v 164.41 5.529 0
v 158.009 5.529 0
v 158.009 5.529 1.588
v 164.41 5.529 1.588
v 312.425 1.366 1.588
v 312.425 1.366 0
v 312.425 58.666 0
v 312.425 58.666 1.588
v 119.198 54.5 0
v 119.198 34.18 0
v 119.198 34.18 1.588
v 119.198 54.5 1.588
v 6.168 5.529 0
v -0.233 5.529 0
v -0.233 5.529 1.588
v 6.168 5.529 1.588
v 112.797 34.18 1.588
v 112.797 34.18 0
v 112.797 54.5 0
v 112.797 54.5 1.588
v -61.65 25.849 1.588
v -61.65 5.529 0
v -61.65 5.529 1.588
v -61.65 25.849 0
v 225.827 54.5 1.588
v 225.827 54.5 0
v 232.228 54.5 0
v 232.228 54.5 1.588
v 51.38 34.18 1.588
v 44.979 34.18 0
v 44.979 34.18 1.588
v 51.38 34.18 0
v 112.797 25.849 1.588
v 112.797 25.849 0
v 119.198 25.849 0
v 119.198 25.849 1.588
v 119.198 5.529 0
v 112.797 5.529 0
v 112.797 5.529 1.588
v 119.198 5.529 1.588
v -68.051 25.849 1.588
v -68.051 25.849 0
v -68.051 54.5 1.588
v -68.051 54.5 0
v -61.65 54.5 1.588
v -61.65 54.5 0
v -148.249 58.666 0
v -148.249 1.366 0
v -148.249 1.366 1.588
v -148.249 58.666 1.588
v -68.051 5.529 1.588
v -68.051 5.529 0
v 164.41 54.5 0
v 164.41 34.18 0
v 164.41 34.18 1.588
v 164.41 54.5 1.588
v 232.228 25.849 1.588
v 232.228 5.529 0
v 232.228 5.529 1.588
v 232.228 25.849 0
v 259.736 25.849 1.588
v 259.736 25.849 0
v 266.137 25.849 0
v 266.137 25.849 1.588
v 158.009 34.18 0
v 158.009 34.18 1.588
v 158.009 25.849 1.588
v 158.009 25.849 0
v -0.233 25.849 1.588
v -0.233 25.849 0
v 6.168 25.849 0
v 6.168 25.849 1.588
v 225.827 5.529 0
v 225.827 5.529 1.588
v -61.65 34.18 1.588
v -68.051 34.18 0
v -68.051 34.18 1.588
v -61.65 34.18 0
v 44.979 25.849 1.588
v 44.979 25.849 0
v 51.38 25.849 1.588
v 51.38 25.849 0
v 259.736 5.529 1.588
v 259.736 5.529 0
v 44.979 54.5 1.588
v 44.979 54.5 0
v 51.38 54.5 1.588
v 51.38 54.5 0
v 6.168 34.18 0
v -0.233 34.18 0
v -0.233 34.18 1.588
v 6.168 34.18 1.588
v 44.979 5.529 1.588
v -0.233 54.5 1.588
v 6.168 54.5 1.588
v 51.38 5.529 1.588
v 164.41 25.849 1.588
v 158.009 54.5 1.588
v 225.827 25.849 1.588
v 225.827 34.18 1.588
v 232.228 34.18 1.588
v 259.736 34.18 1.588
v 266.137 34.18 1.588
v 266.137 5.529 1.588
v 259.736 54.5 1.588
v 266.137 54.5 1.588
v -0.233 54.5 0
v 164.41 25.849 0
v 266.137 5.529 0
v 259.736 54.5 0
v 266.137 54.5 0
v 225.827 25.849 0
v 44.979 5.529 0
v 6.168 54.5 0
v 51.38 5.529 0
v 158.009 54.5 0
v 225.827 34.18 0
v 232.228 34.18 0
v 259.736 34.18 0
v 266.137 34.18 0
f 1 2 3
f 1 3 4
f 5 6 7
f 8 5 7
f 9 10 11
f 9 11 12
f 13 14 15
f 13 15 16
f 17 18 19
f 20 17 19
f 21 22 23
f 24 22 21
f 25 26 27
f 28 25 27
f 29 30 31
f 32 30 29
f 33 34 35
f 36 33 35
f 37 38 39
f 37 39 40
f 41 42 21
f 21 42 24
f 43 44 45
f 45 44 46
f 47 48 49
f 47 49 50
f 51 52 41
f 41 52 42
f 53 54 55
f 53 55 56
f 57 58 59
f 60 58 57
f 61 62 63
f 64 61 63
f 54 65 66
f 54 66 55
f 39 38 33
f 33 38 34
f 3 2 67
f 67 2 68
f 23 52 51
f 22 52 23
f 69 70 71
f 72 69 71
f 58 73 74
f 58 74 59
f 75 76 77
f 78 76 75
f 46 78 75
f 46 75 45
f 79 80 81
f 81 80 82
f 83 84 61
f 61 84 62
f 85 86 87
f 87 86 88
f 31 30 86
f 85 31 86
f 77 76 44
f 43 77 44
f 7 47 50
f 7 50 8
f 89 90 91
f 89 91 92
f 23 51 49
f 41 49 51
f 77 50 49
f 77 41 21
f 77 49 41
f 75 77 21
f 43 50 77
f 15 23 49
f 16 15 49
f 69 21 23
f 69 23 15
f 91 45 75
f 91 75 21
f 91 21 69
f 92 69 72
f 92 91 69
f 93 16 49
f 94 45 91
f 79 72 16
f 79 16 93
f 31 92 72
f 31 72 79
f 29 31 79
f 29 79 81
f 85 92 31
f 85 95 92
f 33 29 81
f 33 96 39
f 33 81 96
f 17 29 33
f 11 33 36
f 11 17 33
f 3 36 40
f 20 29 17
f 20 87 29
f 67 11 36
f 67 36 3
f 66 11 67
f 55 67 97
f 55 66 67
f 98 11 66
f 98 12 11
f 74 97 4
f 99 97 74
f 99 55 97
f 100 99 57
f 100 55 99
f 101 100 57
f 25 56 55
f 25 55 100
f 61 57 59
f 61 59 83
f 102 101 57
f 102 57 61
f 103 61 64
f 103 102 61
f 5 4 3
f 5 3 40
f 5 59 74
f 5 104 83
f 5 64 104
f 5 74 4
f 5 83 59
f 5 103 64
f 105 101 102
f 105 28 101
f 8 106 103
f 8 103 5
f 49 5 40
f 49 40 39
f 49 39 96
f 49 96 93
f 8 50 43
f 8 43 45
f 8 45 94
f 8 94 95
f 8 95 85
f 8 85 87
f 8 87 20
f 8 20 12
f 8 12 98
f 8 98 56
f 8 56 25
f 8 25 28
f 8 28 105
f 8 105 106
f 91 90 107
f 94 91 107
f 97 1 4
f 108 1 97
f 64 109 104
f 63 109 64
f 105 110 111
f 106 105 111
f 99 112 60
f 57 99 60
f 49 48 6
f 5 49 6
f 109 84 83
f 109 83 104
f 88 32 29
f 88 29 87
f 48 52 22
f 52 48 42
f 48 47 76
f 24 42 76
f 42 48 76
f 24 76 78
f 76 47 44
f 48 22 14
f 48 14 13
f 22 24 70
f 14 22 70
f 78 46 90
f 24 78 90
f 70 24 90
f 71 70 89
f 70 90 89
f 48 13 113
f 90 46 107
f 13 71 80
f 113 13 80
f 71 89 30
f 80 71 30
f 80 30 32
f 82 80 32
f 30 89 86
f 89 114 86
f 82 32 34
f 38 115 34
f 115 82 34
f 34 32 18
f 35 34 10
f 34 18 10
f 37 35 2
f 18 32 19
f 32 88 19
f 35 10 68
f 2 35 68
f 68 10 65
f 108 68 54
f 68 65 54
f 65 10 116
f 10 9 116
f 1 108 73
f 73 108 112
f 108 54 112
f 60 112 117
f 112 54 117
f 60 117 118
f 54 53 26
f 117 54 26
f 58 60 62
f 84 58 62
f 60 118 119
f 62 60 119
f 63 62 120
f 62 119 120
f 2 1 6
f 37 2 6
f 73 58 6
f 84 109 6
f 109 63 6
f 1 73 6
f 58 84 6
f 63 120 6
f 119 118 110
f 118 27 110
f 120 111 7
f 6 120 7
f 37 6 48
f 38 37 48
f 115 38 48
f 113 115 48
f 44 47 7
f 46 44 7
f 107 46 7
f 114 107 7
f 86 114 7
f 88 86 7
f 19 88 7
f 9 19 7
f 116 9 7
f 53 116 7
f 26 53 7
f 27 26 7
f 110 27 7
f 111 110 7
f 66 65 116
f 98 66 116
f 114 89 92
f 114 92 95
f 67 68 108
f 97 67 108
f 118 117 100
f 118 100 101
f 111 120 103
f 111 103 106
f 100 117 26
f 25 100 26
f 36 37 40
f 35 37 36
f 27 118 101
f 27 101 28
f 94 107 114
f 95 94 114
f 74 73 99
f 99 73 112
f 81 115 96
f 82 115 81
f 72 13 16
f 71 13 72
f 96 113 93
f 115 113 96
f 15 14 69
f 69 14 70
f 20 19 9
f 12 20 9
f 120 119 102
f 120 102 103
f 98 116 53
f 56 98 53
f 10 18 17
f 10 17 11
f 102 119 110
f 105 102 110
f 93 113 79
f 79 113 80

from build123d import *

# Parameters (mm, degrees)
SKETCH12_W          = 460.674
SKETCH12_H          = 57.3
SKETCH12_W_2        = 6.401239002
SKETCH12_H_2        = 20.32
BOSS_EXTRUDE5_DEPTH = 1.5875


with BuildPart() as part:
    # Sketch12 → Boss-Extrude5 (new body)
    with BuildSketch(Plane.XY):
        with Locations((82.08822952, 30.015906355)):
            Rectangle(SKETCH12_W, SKETCH12_H)
        with Locations((161.20922952, 44.340306355)):
            Rectangle(SKETCH12_W_2, SKETCH12_H_2, mode=Mode.SUBTRACT)
        with Locations((115.99722952, 44.340306355)):
            Rectangle(SKETCH12_W_2, SKETCH12_H_2, mode=Mode.SUBTRACT)
        with Locations((115.99722952, 15.689106355)):
            Rectangle(SKETCH12_W_2, SKETCH12_H_2, mode=Mode.SUBTRACT)
        with Locations((161.20922952, 15.689106355)):
            Rectangle(SKETCH12_W_2, SKETCH12_H_2, mode=Mode.SUBTRACT)
        with Locations((229.02722952, 44.340306355)):
            Rectangle(SKETCH12_W_2, SKETCH12_H_2, mode=Mode.SUBTRACT)
        with Locations((229.02722952, 15.689106355)):
            Rectangle(SKETCH12_W_2, SKETCH12_H_2, mode=Mode.SUBTRACT)
        with Locations((262.93622952, 44.340306355)):
            Rectangle(SKETCH12_W_2, SKETCH12_H_2, mode=Mode.SUBTRACT)
        with Locations((262.93622952, 15.689106355)):
            Rectangle(SKETCH12_W_2, SKETCH12_H_2, mode=Mode.SUBTRACT)
        with Locations((48.17922952, 44.340306355)):
            Rectangle(SKETCH12_W_2, SKETCH12_H_2, mode=Mode.SUBTRACT)
        with Locations((48.17922952, 15.689106355)):
            Rectangle(SKETCH12_W_2, SKETCH12_H_2, mode=Mode.SUBTRACT)
        with Locations((2.96722952, 44.340306355)):
            Rectangle(SKETCH12_W_2, SKETCH12_H_2, mode=Mode.SUBTRACT)
        with Locations((2.96722952, 15.689106355)):
            Rectangle(SKETCH12_W_2, SKETCH12_H_2, mode=Mode.SUBTRACT)
        with Locations((-64.85077048, 44.340306355)):
            Rectangle(SKETCH12_W_2, SKETCH12_H_2, mode=Mode.SUBTRACT)
        with Locations((-64.85077048, 15.689106355)):
            Rectangle(SKETCH12_W_2, SKETCH12_H_2, mode=Mode.SUBTRACT)
    extrude(amount=BOSS_EXTRUDE5_DEPTH)


solid = part.part
